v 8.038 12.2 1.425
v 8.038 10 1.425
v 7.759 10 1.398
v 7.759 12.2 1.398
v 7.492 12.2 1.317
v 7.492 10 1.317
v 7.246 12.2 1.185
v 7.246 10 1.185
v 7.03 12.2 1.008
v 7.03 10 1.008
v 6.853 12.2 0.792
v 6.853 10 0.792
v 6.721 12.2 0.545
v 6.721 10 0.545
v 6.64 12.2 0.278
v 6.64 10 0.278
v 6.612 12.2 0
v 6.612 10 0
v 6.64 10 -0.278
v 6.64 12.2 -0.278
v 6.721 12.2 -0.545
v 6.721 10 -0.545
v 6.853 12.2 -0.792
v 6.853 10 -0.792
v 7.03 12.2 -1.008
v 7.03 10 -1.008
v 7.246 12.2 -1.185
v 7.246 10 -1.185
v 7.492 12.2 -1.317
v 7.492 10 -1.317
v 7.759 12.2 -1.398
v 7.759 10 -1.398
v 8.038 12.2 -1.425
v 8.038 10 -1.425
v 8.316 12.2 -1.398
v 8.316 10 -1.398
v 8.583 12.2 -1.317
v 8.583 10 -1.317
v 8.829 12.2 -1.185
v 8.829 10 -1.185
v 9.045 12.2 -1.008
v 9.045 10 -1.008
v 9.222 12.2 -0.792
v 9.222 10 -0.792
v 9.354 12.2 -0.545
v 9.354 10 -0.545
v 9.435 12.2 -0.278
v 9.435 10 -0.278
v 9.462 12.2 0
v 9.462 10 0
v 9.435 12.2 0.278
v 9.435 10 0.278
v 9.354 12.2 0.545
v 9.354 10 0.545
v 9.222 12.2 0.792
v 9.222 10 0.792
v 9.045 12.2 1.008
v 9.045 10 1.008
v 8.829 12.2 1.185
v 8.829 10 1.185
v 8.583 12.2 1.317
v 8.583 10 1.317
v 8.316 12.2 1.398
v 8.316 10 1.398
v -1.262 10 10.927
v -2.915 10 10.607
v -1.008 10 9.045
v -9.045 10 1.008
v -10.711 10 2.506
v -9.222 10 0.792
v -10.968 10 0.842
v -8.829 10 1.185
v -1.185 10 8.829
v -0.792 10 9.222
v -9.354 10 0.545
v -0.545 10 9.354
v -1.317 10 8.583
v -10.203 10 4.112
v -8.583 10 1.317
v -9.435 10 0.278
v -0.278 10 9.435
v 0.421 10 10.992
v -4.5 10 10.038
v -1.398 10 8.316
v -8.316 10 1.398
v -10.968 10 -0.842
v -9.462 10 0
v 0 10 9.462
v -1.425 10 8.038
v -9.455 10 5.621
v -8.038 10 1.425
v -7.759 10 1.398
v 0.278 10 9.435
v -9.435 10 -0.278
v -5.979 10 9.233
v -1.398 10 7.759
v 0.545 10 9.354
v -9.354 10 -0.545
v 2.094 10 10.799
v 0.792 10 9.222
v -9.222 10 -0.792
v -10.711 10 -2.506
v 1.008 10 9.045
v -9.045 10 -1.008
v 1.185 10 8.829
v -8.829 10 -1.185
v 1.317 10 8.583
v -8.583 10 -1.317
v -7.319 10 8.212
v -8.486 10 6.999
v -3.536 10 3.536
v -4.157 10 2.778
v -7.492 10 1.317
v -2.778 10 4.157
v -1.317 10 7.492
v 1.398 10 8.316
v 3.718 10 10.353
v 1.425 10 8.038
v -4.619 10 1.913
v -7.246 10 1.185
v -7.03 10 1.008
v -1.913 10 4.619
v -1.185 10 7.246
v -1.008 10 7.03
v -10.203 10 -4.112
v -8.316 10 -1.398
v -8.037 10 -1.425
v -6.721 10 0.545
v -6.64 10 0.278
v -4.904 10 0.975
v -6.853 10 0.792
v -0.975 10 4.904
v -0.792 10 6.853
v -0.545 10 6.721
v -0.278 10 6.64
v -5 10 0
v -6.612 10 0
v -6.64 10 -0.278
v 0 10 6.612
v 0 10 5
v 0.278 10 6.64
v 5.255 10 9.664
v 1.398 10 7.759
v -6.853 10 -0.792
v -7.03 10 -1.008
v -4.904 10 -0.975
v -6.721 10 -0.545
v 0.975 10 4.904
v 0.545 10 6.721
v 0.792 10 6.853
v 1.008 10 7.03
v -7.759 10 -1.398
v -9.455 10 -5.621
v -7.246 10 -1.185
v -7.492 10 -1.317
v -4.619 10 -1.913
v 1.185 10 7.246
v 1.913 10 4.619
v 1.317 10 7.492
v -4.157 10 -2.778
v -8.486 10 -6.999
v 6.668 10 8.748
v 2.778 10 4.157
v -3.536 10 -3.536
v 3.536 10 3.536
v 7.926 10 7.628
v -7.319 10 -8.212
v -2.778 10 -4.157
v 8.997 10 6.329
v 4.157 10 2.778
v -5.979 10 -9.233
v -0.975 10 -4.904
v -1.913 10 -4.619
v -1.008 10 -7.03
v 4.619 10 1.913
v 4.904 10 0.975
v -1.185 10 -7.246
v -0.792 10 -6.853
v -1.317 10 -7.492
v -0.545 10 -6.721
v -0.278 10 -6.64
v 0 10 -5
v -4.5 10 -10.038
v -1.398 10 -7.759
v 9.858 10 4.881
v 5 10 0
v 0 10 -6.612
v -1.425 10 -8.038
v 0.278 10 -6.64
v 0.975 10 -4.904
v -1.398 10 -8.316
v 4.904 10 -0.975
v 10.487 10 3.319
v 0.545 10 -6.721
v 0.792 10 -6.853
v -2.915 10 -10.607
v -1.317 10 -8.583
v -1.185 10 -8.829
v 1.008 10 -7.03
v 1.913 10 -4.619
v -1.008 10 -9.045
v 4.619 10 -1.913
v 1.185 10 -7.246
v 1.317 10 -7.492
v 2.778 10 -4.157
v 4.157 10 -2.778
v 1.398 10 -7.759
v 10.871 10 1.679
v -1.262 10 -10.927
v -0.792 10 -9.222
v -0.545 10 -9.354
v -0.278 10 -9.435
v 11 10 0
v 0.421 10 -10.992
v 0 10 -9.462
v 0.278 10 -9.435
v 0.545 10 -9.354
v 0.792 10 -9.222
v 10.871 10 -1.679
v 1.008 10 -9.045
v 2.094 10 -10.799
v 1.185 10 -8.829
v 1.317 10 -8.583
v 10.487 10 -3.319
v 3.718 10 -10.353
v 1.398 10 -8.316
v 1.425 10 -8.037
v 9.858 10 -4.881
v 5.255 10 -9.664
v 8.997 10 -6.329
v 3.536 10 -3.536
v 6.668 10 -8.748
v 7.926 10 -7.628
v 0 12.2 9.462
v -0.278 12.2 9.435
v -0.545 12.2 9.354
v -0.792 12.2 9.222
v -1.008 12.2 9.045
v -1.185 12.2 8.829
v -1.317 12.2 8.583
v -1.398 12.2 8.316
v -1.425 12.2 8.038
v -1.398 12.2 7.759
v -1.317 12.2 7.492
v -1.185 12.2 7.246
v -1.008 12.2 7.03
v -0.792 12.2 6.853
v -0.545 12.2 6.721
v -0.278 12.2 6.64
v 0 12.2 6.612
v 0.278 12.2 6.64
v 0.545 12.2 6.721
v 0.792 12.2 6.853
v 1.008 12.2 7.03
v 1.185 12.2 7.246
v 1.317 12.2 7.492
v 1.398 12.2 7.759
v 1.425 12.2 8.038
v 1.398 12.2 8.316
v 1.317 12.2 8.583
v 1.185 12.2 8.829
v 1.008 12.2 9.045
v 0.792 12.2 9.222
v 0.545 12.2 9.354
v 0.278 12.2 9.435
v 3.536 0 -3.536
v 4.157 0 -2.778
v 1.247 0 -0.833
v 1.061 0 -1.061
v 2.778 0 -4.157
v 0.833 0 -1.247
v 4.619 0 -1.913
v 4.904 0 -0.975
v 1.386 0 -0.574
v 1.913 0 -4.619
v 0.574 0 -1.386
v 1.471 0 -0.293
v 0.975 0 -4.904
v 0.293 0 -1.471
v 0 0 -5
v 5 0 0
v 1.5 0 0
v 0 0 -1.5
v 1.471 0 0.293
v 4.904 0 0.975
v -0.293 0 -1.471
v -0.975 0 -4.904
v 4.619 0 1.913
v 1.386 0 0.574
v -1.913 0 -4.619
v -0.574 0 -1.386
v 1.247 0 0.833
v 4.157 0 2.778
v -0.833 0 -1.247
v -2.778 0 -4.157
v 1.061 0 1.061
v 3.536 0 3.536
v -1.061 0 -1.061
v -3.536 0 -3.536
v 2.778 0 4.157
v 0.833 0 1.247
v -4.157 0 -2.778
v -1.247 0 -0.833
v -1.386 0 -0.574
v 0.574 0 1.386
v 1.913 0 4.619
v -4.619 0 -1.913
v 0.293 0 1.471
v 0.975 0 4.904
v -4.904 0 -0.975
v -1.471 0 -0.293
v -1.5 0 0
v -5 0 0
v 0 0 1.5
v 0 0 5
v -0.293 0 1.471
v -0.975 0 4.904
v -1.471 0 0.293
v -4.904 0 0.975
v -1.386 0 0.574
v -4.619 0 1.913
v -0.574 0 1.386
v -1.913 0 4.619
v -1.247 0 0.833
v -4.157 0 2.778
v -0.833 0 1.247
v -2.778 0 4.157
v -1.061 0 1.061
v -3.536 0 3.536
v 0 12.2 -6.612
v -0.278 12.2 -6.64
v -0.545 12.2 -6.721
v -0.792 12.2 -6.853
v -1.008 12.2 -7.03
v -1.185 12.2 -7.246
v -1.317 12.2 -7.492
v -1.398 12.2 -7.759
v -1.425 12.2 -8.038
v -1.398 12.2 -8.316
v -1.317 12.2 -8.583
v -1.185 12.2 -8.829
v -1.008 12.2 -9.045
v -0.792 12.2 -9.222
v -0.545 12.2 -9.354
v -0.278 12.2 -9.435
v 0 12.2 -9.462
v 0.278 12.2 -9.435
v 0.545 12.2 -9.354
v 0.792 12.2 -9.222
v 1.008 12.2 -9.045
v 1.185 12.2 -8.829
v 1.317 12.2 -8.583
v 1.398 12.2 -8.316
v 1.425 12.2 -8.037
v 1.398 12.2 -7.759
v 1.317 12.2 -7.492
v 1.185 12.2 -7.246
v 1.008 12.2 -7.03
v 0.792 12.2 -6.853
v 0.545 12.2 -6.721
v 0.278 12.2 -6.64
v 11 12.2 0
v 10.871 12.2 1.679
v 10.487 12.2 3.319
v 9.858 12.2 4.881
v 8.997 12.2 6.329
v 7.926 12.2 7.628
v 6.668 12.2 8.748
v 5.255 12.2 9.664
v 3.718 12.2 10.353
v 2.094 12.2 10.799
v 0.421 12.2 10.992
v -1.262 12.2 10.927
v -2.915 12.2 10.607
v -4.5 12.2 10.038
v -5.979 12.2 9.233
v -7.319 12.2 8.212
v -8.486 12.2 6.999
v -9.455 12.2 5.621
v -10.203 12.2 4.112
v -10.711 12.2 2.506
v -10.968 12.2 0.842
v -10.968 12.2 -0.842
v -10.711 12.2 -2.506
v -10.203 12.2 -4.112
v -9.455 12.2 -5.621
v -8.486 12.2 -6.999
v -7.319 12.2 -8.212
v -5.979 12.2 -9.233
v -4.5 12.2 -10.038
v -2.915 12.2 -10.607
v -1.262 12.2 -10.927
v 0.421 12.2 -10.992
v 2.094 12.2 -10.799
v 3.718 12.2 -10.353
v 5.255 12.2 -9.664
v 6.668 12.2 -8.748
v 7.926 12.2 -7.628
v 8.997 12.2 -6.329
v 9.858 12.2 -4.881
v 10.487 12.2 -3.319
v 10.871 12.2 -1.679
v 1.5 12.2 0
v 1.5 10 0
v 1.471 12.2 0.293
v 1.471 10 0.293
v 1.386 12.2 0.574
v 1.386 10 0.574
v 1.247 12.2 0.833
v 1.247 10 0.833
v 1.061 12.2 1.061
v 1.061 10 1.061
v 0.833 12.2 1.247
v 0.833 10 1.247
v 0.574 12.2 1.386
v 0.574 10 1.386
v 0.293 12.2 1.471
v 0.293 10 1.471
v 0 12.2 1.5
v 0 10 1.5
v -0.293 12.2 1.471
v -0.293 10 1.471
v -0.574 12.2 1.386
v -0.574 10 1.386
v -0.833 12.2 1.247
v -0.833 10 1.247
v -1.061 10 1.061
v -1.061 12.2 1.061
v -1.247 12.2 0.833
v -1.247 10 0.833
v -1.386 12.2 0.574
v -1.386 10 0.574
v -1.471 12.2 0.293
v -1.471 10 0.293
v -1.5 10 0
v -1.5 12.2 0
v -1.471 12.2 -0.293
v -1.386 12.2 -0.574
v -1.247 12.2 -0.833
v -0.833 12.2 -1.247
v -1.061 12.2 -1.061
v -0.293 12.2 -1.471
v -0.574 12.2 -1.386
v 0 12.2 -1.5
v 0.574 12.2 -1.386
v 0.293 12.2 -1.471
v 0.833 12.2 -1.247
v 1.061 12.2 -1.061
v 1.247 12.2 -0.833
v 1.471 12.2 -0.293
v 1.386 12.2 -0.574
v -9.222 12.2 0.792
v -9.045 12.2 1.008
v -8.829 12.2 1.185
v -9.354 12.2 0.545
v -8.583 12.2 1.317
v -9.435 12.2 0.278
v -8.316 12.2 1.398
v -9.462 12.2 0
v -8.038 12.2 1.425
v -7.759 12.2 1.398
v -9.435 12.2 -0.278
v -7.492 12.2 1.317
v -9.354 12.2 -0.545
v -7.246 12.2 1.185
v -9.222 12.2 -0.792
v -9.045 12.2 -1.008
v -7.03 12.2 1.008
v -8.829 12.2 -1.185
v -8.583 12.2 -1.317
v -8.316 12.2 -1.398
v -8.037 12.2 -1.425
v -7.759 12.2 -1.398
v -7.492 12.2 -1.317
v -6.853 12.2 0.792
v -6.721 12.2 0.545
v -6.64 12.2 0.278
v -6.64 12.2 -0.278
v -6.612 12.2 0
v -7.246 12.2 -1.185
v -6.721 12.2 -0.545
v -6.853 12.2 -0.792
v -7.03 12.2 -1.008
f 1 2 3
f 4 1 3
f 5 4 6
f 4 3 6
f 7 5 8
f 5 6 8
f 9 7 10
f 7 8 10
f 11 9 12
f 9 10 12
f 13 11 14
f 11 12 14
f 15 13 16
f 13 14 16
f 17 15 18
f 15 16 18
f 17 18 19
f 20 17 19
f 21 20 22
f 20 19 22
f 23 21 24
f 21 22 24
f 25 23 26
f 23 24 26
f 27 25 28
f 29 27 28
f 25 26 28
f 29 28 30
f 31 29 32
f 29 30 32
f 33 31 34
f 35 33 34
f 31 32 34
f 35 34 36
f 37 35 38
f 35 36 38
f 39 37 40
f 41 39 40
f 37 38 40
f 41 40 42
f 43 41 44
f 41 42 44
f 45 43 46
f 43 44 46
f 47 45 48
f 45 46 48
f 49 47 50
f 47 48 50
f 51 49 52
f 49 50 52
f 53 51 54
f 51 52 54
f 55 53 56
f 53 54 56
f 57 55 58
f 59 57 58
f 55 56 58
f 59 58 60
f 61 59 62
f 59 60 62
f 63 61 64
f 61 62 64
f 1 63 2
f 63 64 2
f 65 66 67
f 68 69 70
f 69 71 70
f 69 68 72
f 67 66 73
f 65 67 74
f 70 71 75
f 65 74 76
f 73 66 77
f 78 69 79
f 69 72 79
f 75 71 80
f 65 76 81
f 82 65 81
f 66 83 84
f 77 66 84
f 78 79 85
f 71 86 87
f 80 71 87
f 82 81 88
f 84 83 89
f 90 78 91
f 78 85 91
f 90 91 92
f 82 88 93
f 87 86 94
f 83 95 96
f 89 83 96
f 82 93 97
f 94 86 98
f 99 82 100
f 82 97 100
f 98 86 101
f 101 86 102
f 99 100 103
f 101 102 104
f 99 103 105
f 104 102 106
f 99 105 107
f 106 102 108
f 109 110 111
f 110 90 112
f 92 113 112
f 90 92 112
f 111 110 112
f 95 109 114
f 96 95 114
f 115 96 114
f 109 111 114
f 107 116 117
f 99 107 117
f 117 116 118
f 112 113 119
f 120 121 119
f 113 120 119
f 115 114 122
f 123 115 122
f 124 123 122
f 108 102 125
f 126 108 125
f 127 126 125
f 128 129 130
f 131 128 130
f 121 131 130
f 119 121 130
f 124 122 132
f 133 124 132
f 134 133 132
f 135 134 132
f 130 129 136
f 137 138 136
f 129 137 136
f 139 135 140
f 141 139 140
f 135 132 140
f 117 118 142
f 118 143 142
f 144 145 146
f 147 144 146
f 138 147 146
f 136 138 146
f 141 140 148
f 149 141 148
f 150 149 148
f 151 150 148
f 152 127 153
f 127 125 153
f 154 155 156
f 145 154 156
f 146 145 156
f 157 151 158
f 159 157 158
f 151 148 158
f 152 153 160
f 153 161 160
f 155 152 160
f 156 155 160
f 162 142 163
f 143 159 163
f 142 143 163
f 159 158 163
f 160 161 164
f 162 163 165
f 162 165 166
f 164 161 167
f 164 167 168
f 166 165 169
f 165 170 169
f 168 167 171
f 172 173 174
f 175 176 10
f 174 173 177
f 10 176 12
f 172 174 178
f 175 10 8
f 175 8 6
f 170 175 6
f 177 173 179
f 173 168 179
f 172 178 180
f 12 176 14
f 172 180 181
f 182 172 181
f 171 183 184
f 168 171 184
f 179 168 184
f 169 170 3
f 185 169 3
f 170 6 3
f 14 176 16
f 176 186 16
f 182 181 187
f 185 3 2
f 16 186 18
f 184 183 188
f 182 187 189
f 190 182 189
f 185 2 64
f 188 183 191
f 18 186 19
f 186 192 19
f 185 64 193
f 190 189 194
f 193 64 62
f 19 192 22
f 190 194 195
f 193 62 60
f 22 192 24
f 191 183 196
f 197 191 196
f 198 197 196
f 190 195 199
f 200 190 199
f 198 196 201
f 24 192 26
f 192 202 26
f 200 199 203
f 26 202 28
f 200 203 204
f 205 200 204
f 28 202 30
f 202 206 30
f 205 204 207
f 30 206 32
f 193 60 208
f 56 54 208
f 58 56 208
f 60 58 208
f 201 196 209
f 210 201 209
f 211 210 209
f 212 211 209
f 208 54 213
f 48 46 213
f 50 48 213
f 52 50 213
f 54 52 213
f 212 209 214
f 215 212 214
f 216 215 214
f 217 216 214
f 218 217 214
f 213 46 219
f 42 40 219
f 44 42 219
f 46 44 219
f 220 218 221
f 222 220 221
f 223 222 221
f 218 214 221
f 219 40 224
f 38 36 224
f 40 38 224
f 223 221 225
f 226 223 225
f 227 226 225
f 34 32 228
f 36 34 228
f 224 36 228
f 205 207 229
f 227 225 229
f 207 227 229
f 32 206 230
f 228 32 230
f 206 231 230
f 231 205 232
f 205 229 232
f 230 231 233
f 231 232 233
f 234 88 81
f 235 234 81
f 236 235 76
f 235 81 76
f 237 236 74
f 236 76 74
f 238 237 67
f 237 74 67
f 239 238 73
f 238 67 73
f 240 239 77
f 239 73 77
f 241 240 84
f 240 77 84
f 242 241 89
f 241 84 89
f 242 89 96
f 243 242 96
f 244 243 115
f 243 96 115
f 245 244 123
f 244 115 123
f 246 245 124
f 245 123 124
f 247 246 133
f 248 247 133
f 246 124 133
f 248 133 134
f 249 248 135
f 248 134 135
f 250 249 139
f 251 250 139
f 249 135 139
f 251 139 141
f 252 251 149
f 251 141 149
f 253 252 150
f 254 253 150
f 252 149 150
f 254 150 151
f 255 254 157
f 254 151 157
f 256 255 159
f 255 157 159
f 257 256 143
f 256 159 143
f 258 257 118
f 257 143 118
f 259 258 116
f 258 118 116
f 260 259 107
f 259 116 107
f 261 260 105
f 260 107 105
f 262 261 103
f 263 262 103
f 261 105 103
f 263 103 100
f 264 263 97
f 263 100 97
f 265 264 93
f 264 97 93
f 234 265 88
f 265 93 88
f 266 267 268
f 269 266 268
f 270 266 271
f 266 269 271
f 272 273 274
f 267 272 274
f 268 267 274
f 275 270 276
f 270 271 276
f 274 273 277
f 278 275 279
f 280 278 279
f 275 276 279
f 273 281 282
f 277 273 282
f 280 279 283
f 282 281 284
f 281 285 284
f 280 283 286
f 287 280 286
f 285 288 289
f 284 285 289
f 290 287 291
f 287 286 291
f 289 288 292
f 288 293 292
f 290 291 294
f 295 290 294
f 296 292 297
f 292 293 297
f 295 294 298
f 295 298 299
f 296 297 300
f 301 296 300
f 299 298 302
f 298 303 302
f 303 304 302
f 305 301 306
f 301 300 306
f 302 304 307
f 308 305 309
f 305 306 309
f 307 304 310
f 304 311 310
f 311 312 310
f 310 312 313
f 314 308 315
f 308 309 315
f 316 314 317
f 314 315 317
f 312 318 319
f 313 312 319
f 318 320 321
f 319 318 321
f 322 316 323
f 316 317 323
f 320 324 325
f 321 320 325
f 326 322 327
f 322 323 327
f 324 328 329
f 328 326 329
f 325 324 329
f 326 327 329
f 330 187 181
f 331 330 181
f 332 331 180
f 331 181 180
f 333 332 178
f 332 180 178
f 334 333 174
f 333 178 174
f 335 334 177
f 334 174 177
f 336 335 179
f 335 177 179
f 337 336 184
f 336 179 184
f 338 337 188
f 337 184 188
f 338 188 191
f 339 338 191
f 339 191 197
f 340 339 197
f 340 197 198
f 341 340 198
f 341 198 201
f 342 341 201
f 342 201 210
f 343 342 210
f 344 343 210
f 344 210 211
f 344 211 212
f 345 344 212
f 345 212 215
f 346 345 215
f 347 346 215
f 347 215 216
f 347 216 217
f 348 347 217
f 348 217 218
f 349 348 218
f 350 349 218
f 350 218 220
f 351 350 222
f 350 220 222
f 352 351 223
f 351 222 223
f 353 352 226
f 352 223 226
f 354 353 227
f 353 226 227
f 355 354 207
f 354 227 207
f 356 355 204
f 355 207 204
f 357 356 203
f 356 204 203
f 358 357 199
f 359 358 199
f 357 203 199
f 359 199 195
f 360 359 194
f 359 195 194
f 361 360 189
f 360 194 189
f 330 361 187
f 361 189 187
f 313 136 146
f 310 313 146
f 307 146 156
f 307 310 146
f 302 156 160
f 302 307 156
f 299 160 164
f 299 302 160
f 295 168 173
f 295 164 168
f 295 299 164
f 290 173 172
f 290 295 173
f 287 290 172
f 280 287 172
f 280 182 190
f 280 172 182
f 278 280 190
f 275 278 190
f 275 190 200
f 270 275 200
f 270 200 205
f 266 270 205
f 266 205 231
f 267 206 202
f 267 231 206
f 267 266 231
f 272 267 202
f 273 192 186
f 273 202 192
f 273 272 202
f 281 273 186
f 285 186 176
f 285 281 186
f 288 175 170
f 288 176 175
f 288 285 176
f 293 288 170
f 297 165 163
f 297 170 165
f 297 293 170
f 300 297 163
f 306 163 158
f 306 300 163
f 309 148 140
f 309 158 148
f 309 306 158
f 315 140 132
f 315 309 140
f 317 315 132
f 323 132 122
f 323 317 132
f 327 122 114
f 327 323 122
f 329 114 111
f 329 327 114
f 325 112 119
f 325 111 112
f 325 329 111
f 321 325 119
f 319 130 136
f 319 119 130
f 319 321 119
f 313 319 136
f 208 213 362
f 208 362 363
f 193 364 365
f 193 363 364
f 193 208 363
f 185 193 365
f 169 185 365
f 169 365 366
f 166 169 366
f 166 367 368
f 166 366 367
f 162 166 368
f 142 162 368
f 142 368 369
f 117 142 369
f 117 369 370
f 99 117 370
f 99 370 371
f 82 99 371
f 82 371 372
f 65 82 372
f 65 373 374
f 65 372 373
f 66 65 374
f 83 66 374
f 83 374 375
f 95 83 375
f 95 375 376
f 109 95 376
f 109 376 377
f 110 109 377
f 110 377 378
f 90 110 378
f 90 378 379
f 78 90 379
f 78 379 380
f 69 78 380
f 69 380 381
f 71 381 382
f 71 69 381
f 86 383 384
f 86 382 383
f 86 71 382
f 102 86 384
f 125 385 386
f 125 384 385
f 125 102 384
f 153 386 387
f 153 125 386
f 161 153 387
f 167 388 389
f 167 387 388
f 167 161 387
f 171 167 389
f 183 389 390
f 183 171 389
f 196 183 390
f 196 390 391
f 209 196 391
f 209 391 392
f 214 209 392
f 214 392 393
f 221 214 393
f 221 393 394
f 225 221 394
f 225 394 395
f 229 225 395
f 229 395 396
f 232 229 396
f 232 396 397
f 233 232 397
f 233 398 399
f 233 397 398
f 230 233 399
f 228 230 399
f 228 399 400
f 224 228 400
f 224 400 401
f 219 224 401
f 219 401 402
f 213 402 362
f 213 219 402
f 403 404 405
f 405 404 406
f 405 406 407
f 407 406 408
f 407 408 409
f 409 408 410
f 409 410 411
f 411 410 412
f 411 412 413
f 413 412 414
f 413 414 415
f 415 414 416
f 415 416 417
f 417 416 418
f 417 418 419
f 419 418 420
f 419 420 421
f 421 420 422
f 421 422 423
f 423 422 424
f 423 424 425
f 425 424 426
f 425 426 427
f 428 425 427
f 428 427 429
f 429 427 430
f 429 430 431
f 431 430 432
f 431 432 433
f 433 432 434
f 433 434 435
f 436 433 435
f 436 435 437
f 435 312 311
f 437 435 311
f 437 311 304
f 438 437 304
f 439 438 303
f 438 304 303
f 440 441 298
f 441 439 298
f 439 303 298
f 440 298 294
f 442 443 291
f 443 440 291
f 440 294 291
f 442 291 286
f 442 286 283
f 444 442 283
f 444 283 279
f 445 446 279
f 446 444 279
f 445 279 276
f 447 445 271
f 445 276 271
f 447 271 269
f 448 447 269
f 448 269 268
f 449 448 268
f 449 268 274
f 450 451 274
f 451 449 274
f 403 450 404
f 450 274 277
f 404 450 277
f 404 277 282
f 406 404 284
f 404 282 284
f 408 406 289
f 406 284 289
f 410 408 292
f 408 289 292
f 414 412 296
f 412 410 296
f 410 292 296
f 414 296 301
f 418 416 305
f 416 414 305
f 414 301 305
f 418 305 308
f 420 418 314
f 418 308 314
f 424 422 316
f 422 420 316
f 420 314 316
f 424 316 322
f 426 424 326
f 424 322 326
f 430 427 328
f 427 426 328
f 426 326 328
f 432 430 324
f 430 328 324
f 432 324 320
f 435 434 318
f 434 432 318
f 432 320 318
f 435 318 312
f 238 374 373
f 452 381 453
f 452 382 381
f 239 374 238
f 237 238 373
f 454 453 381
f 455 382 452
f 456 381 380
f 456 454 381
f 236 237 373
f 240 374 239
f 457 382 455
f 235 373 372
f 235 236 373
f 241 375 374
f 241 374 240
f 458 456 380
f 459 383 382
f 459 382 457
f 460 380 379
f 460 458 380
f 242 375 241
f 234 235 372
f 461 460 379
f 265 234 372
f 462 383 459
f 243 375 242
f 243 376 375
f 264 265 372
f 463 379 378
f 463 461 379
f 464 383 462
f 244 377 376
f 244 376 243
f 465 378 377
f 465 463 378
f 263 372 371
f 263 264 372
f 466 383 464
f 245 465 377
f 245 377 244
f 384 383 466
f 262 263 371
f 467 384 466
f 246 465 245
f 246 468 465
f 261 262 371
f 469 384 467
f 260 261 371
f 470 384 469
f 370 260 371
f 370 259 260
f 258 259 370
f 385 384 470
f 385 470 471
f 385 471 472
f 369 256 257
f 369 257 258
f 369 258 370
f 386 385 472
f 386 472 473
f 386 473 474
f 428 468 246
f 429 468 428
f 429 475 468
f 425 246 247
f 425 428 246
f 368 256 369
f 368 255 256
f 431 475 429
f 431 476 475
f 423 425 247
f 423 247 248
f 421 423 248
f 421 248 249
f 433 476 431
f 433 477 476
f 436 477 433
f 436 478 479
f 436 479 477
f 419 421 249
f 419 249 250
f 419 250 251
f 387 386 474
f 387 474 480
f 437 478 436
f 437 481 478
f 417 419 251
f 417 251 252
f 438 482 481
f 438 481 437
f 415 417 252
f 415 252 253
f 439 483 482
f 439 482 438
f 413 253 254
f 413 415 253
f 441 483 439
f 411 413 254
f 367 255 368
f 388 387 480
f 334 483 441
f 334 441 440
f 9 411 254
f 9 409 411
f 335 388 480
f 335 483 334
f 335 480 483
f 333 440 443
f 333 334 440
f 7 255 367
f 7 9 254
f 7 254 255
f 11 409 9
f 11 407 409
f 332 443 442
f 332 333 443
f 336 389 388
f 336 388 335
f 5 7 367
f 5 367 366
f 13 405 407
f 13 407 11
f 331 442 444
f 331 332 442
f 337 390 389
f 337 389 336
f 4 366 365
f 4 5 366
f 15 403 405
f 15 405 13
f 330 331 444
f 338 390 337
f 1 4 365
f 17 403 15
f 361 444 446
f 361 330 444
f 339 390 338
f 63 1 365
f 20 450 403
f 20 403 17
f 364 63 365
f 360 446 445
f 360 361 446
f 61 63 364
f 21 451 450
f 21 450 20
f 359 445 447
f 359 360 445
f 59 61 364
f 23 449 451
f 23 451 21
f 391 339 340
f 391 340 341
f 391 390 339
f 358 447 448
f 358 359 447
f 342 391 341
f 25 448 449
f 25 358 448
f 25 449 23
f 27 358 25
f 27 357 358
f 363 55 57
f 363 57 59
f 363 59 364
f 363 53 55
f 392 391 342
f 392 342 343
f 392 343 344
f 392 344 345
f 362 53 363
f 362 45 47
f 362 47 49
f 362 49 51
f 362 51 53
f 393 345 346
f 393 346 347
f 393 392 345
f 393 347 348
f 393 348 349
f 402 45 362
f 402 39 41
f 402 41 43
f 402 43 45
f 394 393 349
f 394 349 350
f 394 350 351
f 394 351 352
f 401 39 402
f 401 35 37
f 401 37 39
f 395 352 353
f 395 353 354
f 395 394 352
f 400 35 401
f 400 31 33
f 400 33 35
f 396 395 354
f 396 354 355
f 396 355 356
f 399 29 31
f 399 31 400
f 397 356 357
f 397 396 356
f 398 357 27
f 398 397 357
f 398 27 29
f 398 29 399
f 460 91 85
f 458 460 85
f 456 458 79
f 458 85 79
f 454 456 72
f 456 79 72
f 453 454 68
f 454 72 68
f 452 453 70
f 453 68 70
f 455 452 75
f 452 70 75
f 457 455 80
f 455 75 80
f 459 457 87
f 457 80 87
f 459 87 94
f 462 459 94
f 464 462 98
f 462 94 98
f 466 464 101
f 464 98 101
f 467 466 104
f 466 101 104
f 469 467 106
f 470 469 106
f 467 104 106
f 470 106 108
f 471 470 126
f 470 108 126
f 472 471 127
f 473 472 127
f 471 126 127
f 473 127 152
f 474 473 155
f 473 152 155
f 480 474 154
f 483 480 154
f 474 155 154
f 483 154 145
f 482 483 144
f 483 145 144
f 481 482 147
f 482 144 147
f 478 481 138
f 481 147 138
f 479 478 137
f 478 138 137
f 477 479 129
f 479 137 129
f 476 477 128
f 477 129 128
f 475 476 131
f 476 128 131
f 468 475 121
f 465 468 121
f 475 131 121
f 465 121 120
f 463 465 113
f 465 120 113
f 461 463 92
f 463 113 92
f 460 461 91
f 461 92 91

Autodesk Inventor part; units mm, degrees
ref_plane "YZ Plane" through (0, 0, 0) normal (1, 0, 0) x (0, 1, 0)
ref_plane "XZ Plane" through (0, 0, 0) normal (0, 1, 0) x (-1, 0, 0)
ref_plane "XY Plane" through (0, 0, 0) normal (0, 0, 1) x (1, 0, 0)
sketch "Boceto1" plane through (0, 0, 0) normal (0, 1, 0) x (-1, 0, 0)
  circle A0 centre (0, 0) radius 5
  circle A1 centre (0, 0) radius 1.5
  dimension "d0" = 10
  dimension "d1" = 3
extrude "Extrusión1" add sketch "Boceto1" along normal blind 10
sketch "Boceto2" plane through (0, 10, 0) normal (0, 1, 0) x (1, 0, 0)
  circle A0 centre (0, 0) radius 11
  circle A1 centre (0, 0) radius 5 projected
  circle A2 centre (0, 0) radius 1.5 projected
  dimension "d4" = 22
extrude "Extrusión2" add sketch "Boceto2" along normal blind 2.2 contours A0 | A1
sketch "Boceto3" plane through (0, 12.2, 0) normal (0, 1, 0) x (1, 0, 0)
  circle A0 centre (0, 0) radius 9.475
  circle A1 centre (0, 0) radius 6.6
  line L0 (0, -6.6) -> (0, -9.475)
  circle A2 centre (0, -8.0375) radius 1.4375
  circle A3 centre (8.0375, 0) radius 1.4375
  circle A4 centre (0, 8.0375) radius 1.4375
  circle A5 centre (-8.0375, 0) radius 1.4375
  dimension "d7" = 18.95
  dimension "d8" = 13.2
  dimension "d11" = 360
hole "Agujero1" at (0, 12.2, 8.0375) at (-8.0375, 12.2, 0) at (0, 12.2, -8.0375) at (8.0375, 12.2, 0) direction (0, -1, 0) diameter 2.85 end through all
properties part number "Acople motor" material "Hierro, dúctil"
